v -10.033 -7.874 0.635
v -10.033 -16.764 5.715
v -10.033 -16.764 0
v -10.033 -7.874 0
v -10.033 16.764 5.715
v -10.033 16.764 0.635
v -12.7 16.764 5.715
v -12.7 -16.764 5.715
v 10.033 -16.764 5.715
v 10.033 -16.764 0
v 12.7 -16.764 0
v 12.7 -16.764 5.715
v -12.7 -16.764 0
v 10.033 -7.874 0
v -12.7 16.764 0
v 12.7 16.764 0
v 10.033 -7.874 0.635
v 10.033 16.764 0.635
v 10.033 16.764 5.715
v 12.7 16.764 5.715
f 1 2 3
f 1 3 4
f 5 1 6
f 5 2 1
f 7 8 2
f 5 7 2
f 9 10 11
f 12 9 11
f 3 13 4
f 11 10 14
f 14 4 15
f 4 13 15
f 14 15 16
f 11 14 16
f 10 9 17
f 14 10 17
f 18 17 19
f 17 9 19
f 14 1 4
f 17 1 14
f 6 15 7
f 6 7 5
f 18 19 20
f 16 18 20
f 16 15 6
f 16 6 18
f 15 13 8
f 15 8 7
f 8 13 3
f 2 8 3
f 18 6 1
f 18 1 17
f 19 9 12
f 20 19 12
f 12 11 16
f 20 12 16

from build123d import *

# Parameters (mm, degrees)
F0_W     = 25.4
F0_H     = 33.528
F1_DEPTH = 5.715
F3_W     = 20.066
F3_H     = 33.655
F4_DEPTH = 5.08
F5_W     = 20.066
F5_H     = 8.89
F6_DEPTH = 25.4


with BuildPart() as f1:
    # F0 (on Top) → F1 (new body)
    with BuildSketch(Plane.XY):
        Rectangle(F0_W, F0_H)
    extrude(amount=F1_DEPTH)

    # F3 (on face) → F4 (cut)
    with BuildSketch(Plane.XY.offset(5.715)):
        Rectangle(F3_W, F3_H)
    extrude(amount=-F4_DEPTH, mode=Mode.SUBTRACT)

    # F5 (on face) → F6 (cut)
    with BuildSketch(Plane.XY.offset(0.635)):
        with Locations((0, -12.319)):
            Rectangle(F5_W, F5_H)
    extrude(amount=-F6_DEPTH, mode=Mode.SUBTRACT)


solid = f1.part
